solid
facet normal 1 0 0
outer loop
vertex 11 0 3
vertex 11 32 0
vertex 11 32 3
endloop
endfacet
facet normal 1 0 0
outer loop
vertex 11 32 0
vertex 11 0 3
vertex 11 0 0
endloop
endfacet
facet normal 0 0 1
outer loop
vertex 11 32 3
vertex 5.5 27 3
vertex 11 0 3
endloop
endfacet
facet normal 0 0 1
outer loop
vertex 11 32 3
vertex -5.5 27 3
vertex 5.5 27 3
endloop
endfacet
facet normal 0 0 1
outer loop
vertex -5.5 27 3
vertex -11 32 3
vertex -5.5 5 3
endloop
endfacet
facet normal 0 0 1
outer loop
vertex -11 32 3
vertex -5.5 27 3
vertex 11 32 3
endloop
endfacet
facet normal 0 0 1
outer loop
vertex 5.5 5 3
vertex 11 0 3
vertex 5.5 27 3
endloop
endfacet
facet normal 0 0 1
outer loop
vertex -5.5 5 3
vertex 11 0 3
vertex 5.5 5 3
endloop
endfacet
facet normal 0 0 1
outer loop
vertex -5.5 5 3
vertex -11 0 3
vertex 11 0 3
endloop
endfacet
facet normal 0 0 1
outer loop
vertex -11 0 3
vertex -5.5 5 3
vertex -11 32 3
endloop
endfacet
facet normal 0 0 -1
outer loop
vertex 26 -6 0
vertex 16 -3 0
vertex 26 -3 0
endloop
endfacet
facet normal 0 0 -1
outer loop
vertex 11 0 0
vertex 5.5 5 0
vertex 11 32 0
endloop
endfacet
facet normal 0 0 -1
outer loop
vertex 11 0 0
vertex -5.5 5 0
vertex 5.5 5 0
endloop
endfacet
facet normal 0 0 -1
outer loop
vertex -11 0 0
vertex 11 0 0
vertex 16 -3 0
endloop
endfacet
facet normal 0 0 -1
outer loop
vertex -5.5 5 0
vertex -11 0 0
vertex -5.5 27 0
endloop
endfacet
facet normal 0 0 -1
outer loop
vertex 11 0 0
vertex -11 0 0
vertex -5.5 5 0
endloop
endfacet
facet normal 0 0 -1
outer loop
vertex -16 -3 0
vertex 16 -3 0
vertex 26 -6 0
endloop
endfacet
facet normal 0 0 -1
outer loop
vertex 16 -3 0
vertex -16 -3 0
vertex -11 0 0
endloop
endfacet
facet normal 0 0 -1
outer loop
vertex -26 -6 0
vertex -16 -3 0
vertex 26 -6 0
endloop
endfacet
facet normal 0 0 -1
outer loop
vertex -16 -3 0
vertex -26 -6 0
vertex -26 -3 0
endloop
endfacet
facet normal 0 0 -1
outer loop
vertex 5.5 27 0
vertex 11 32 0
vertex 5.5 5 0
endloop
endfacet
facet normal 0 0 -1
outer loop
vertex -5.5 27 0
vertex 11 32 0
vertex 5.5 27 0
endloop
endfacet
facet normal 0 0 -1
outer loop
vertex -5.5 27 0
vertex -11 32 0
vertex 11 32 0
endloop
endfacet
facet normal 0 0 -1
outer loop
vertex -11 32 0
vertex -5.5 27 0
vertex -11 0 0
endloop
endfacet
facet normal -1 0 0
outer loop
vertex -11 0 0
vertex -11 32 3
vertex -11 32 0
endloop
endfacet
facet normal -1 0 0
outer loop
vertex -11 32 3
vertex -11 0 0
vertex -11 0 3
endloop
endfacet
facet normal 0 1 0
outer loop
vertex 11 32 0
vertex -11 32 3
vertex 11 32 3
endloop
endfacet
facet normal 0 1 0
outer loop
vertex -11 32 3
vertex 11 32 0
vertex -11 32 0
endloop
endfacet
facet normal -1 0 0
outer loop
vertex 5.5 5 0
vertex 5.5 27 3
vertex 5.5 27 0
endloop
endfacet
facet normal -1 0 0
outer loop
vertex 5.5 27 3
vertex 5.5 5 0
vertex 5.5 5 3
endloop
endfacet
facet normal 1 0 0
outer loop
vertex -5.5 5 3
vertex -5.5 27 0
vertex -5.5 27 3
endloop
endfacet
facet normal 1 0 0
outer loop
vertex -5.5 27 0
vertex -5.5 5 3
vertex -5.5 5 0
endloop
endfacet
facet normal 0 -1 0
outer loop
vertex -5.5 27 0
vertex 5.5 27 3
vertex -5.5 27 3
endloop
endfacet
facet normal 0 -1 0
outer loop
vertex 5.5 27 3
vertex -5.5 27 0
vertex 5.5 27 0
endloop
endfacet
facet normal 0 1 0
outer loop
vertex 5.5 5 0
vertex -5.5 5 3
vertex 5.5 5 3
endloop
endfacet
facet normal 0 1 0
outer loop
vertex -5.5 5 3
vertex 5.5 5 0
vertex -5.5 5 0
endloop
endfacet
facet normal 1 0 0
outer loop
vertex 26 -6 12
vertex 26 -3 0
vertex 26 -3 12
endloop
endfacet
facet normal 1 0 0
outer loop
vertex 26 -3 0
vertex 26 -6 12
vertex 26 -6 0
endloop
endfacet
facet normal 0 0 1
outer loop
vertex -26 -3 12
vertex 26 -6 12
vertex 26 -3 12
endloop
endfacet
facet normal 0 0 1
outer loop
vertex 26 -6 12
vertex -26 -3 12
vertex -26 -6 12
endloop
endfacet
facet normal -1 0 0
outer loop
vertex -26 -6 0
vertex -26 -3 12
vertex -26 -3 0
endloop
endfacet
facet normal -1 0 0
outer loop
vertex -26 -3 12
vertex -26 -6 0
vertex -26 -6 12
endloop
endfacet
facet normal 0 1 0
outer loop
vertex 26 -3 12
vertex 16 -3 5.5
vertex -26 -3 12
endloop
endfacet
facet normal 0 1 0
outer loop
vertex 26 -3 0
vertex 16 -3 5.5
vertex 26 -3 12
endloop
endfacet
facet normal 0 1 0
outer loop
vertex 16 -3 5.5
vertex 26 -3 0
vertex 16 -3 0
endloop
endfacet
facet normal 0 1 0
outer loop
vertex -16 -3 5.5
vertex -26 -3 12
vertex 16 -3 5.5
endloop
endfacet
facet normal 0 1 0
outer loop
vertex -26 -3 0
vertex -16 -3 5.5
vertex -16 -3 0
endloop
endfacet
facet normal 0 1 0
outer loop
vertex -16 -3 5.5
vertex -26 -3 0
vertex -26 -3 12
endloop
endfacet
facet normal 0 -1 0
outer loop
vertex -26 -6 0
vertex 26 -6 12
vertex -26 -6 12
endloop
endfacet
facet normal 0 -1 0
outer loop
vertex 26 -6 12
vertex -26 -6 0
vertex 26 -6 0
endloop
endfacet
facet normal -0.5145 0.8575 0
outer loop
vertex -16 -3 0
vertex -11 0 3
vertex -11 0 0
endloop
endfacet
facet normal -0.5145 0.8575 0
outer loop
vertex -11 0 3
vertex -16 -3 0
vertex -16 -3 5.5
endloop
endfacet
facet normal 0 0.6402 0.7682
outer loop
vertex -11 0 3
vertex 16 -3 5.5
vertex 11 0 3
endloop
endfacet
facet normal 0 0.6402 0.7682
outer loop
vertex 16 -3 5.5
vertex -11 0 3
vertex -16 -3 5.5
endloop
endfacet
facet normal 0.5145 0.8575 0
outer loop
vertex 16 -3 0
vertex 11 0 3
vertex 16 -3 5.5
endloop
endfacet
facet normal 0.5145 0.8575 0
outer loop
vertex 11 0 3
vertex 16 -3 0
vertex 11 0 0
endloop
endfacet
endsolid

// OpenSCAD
// -------------------------------------------------------------beltclip.scad
//
//
//
//
$fa = 1;
$fs = 0.4;
clipLength=32.00;
clipHeight=3.0;
clipWidth=22.0;
clipHoleWidth=11.0;
clipHoleLength=22.0;
clipHandleWidth=52.0;
clipHandleLength=3.0;
clipHandleHeight=12.0;
clipHandleOffset=-6.0;
wedgeHeight=8.0;
wedgeWidth=42.0;
union(){
    difference (){

    translate([-(clipWidth/2.0),0,0]){
        cube([clipWidth,clipLength,clipHeight], center=false);
    }
    translate([-(clipHoleWidth/2.0),(clipLength-clipHoleLength)/2.0,-2.0]){
        cube([clipHoleWidth,clipHoleLength,clipHeight+4], center=false);
    }
    }
    translate([-(clipHandleWidth/2.0),(clipHandleOffset),0]){
        cube([clipHandleWidth,clipHandleLength,clipHandleHeight], center=false);
    }

    CubePoints = [
    [  -(wedgeWidth/2.0),  (clipHandleOffset),  0 ],  //0
    [ -(clipWidth/2.0),  0,  0 ],  //1
    [ (clipWidth/2.0),  0,  0 ],  //2
    [  (wedgeWidth/2.0),  (clipHandleOffset),  0 ],  //3
    [  -(wedgeWidth/2.0),  (clipHandleOffset), wedgeHeight ],  //4
    [ -(clipWidth/2.0),  0,  (clipHeight) ],  //5
    [ (clipWidth/2.0),  0,  (clipHeight) ],  //6
    [  (wedgeWidth/2.0),  (clipHandleOffset), wedgeHeight ]]; //7
    
    CubeFaces = [
    [0,1,2,3],  // bottom
    [4,5,1,0],  // front
    [7,6,5,4],  // top
    [5,6,2,1],  // right
    [6,7,3,2],  // back
    [7,4,0,3]]; // left
    
    polyhedron( CubePoints, CubeFaces );
}
